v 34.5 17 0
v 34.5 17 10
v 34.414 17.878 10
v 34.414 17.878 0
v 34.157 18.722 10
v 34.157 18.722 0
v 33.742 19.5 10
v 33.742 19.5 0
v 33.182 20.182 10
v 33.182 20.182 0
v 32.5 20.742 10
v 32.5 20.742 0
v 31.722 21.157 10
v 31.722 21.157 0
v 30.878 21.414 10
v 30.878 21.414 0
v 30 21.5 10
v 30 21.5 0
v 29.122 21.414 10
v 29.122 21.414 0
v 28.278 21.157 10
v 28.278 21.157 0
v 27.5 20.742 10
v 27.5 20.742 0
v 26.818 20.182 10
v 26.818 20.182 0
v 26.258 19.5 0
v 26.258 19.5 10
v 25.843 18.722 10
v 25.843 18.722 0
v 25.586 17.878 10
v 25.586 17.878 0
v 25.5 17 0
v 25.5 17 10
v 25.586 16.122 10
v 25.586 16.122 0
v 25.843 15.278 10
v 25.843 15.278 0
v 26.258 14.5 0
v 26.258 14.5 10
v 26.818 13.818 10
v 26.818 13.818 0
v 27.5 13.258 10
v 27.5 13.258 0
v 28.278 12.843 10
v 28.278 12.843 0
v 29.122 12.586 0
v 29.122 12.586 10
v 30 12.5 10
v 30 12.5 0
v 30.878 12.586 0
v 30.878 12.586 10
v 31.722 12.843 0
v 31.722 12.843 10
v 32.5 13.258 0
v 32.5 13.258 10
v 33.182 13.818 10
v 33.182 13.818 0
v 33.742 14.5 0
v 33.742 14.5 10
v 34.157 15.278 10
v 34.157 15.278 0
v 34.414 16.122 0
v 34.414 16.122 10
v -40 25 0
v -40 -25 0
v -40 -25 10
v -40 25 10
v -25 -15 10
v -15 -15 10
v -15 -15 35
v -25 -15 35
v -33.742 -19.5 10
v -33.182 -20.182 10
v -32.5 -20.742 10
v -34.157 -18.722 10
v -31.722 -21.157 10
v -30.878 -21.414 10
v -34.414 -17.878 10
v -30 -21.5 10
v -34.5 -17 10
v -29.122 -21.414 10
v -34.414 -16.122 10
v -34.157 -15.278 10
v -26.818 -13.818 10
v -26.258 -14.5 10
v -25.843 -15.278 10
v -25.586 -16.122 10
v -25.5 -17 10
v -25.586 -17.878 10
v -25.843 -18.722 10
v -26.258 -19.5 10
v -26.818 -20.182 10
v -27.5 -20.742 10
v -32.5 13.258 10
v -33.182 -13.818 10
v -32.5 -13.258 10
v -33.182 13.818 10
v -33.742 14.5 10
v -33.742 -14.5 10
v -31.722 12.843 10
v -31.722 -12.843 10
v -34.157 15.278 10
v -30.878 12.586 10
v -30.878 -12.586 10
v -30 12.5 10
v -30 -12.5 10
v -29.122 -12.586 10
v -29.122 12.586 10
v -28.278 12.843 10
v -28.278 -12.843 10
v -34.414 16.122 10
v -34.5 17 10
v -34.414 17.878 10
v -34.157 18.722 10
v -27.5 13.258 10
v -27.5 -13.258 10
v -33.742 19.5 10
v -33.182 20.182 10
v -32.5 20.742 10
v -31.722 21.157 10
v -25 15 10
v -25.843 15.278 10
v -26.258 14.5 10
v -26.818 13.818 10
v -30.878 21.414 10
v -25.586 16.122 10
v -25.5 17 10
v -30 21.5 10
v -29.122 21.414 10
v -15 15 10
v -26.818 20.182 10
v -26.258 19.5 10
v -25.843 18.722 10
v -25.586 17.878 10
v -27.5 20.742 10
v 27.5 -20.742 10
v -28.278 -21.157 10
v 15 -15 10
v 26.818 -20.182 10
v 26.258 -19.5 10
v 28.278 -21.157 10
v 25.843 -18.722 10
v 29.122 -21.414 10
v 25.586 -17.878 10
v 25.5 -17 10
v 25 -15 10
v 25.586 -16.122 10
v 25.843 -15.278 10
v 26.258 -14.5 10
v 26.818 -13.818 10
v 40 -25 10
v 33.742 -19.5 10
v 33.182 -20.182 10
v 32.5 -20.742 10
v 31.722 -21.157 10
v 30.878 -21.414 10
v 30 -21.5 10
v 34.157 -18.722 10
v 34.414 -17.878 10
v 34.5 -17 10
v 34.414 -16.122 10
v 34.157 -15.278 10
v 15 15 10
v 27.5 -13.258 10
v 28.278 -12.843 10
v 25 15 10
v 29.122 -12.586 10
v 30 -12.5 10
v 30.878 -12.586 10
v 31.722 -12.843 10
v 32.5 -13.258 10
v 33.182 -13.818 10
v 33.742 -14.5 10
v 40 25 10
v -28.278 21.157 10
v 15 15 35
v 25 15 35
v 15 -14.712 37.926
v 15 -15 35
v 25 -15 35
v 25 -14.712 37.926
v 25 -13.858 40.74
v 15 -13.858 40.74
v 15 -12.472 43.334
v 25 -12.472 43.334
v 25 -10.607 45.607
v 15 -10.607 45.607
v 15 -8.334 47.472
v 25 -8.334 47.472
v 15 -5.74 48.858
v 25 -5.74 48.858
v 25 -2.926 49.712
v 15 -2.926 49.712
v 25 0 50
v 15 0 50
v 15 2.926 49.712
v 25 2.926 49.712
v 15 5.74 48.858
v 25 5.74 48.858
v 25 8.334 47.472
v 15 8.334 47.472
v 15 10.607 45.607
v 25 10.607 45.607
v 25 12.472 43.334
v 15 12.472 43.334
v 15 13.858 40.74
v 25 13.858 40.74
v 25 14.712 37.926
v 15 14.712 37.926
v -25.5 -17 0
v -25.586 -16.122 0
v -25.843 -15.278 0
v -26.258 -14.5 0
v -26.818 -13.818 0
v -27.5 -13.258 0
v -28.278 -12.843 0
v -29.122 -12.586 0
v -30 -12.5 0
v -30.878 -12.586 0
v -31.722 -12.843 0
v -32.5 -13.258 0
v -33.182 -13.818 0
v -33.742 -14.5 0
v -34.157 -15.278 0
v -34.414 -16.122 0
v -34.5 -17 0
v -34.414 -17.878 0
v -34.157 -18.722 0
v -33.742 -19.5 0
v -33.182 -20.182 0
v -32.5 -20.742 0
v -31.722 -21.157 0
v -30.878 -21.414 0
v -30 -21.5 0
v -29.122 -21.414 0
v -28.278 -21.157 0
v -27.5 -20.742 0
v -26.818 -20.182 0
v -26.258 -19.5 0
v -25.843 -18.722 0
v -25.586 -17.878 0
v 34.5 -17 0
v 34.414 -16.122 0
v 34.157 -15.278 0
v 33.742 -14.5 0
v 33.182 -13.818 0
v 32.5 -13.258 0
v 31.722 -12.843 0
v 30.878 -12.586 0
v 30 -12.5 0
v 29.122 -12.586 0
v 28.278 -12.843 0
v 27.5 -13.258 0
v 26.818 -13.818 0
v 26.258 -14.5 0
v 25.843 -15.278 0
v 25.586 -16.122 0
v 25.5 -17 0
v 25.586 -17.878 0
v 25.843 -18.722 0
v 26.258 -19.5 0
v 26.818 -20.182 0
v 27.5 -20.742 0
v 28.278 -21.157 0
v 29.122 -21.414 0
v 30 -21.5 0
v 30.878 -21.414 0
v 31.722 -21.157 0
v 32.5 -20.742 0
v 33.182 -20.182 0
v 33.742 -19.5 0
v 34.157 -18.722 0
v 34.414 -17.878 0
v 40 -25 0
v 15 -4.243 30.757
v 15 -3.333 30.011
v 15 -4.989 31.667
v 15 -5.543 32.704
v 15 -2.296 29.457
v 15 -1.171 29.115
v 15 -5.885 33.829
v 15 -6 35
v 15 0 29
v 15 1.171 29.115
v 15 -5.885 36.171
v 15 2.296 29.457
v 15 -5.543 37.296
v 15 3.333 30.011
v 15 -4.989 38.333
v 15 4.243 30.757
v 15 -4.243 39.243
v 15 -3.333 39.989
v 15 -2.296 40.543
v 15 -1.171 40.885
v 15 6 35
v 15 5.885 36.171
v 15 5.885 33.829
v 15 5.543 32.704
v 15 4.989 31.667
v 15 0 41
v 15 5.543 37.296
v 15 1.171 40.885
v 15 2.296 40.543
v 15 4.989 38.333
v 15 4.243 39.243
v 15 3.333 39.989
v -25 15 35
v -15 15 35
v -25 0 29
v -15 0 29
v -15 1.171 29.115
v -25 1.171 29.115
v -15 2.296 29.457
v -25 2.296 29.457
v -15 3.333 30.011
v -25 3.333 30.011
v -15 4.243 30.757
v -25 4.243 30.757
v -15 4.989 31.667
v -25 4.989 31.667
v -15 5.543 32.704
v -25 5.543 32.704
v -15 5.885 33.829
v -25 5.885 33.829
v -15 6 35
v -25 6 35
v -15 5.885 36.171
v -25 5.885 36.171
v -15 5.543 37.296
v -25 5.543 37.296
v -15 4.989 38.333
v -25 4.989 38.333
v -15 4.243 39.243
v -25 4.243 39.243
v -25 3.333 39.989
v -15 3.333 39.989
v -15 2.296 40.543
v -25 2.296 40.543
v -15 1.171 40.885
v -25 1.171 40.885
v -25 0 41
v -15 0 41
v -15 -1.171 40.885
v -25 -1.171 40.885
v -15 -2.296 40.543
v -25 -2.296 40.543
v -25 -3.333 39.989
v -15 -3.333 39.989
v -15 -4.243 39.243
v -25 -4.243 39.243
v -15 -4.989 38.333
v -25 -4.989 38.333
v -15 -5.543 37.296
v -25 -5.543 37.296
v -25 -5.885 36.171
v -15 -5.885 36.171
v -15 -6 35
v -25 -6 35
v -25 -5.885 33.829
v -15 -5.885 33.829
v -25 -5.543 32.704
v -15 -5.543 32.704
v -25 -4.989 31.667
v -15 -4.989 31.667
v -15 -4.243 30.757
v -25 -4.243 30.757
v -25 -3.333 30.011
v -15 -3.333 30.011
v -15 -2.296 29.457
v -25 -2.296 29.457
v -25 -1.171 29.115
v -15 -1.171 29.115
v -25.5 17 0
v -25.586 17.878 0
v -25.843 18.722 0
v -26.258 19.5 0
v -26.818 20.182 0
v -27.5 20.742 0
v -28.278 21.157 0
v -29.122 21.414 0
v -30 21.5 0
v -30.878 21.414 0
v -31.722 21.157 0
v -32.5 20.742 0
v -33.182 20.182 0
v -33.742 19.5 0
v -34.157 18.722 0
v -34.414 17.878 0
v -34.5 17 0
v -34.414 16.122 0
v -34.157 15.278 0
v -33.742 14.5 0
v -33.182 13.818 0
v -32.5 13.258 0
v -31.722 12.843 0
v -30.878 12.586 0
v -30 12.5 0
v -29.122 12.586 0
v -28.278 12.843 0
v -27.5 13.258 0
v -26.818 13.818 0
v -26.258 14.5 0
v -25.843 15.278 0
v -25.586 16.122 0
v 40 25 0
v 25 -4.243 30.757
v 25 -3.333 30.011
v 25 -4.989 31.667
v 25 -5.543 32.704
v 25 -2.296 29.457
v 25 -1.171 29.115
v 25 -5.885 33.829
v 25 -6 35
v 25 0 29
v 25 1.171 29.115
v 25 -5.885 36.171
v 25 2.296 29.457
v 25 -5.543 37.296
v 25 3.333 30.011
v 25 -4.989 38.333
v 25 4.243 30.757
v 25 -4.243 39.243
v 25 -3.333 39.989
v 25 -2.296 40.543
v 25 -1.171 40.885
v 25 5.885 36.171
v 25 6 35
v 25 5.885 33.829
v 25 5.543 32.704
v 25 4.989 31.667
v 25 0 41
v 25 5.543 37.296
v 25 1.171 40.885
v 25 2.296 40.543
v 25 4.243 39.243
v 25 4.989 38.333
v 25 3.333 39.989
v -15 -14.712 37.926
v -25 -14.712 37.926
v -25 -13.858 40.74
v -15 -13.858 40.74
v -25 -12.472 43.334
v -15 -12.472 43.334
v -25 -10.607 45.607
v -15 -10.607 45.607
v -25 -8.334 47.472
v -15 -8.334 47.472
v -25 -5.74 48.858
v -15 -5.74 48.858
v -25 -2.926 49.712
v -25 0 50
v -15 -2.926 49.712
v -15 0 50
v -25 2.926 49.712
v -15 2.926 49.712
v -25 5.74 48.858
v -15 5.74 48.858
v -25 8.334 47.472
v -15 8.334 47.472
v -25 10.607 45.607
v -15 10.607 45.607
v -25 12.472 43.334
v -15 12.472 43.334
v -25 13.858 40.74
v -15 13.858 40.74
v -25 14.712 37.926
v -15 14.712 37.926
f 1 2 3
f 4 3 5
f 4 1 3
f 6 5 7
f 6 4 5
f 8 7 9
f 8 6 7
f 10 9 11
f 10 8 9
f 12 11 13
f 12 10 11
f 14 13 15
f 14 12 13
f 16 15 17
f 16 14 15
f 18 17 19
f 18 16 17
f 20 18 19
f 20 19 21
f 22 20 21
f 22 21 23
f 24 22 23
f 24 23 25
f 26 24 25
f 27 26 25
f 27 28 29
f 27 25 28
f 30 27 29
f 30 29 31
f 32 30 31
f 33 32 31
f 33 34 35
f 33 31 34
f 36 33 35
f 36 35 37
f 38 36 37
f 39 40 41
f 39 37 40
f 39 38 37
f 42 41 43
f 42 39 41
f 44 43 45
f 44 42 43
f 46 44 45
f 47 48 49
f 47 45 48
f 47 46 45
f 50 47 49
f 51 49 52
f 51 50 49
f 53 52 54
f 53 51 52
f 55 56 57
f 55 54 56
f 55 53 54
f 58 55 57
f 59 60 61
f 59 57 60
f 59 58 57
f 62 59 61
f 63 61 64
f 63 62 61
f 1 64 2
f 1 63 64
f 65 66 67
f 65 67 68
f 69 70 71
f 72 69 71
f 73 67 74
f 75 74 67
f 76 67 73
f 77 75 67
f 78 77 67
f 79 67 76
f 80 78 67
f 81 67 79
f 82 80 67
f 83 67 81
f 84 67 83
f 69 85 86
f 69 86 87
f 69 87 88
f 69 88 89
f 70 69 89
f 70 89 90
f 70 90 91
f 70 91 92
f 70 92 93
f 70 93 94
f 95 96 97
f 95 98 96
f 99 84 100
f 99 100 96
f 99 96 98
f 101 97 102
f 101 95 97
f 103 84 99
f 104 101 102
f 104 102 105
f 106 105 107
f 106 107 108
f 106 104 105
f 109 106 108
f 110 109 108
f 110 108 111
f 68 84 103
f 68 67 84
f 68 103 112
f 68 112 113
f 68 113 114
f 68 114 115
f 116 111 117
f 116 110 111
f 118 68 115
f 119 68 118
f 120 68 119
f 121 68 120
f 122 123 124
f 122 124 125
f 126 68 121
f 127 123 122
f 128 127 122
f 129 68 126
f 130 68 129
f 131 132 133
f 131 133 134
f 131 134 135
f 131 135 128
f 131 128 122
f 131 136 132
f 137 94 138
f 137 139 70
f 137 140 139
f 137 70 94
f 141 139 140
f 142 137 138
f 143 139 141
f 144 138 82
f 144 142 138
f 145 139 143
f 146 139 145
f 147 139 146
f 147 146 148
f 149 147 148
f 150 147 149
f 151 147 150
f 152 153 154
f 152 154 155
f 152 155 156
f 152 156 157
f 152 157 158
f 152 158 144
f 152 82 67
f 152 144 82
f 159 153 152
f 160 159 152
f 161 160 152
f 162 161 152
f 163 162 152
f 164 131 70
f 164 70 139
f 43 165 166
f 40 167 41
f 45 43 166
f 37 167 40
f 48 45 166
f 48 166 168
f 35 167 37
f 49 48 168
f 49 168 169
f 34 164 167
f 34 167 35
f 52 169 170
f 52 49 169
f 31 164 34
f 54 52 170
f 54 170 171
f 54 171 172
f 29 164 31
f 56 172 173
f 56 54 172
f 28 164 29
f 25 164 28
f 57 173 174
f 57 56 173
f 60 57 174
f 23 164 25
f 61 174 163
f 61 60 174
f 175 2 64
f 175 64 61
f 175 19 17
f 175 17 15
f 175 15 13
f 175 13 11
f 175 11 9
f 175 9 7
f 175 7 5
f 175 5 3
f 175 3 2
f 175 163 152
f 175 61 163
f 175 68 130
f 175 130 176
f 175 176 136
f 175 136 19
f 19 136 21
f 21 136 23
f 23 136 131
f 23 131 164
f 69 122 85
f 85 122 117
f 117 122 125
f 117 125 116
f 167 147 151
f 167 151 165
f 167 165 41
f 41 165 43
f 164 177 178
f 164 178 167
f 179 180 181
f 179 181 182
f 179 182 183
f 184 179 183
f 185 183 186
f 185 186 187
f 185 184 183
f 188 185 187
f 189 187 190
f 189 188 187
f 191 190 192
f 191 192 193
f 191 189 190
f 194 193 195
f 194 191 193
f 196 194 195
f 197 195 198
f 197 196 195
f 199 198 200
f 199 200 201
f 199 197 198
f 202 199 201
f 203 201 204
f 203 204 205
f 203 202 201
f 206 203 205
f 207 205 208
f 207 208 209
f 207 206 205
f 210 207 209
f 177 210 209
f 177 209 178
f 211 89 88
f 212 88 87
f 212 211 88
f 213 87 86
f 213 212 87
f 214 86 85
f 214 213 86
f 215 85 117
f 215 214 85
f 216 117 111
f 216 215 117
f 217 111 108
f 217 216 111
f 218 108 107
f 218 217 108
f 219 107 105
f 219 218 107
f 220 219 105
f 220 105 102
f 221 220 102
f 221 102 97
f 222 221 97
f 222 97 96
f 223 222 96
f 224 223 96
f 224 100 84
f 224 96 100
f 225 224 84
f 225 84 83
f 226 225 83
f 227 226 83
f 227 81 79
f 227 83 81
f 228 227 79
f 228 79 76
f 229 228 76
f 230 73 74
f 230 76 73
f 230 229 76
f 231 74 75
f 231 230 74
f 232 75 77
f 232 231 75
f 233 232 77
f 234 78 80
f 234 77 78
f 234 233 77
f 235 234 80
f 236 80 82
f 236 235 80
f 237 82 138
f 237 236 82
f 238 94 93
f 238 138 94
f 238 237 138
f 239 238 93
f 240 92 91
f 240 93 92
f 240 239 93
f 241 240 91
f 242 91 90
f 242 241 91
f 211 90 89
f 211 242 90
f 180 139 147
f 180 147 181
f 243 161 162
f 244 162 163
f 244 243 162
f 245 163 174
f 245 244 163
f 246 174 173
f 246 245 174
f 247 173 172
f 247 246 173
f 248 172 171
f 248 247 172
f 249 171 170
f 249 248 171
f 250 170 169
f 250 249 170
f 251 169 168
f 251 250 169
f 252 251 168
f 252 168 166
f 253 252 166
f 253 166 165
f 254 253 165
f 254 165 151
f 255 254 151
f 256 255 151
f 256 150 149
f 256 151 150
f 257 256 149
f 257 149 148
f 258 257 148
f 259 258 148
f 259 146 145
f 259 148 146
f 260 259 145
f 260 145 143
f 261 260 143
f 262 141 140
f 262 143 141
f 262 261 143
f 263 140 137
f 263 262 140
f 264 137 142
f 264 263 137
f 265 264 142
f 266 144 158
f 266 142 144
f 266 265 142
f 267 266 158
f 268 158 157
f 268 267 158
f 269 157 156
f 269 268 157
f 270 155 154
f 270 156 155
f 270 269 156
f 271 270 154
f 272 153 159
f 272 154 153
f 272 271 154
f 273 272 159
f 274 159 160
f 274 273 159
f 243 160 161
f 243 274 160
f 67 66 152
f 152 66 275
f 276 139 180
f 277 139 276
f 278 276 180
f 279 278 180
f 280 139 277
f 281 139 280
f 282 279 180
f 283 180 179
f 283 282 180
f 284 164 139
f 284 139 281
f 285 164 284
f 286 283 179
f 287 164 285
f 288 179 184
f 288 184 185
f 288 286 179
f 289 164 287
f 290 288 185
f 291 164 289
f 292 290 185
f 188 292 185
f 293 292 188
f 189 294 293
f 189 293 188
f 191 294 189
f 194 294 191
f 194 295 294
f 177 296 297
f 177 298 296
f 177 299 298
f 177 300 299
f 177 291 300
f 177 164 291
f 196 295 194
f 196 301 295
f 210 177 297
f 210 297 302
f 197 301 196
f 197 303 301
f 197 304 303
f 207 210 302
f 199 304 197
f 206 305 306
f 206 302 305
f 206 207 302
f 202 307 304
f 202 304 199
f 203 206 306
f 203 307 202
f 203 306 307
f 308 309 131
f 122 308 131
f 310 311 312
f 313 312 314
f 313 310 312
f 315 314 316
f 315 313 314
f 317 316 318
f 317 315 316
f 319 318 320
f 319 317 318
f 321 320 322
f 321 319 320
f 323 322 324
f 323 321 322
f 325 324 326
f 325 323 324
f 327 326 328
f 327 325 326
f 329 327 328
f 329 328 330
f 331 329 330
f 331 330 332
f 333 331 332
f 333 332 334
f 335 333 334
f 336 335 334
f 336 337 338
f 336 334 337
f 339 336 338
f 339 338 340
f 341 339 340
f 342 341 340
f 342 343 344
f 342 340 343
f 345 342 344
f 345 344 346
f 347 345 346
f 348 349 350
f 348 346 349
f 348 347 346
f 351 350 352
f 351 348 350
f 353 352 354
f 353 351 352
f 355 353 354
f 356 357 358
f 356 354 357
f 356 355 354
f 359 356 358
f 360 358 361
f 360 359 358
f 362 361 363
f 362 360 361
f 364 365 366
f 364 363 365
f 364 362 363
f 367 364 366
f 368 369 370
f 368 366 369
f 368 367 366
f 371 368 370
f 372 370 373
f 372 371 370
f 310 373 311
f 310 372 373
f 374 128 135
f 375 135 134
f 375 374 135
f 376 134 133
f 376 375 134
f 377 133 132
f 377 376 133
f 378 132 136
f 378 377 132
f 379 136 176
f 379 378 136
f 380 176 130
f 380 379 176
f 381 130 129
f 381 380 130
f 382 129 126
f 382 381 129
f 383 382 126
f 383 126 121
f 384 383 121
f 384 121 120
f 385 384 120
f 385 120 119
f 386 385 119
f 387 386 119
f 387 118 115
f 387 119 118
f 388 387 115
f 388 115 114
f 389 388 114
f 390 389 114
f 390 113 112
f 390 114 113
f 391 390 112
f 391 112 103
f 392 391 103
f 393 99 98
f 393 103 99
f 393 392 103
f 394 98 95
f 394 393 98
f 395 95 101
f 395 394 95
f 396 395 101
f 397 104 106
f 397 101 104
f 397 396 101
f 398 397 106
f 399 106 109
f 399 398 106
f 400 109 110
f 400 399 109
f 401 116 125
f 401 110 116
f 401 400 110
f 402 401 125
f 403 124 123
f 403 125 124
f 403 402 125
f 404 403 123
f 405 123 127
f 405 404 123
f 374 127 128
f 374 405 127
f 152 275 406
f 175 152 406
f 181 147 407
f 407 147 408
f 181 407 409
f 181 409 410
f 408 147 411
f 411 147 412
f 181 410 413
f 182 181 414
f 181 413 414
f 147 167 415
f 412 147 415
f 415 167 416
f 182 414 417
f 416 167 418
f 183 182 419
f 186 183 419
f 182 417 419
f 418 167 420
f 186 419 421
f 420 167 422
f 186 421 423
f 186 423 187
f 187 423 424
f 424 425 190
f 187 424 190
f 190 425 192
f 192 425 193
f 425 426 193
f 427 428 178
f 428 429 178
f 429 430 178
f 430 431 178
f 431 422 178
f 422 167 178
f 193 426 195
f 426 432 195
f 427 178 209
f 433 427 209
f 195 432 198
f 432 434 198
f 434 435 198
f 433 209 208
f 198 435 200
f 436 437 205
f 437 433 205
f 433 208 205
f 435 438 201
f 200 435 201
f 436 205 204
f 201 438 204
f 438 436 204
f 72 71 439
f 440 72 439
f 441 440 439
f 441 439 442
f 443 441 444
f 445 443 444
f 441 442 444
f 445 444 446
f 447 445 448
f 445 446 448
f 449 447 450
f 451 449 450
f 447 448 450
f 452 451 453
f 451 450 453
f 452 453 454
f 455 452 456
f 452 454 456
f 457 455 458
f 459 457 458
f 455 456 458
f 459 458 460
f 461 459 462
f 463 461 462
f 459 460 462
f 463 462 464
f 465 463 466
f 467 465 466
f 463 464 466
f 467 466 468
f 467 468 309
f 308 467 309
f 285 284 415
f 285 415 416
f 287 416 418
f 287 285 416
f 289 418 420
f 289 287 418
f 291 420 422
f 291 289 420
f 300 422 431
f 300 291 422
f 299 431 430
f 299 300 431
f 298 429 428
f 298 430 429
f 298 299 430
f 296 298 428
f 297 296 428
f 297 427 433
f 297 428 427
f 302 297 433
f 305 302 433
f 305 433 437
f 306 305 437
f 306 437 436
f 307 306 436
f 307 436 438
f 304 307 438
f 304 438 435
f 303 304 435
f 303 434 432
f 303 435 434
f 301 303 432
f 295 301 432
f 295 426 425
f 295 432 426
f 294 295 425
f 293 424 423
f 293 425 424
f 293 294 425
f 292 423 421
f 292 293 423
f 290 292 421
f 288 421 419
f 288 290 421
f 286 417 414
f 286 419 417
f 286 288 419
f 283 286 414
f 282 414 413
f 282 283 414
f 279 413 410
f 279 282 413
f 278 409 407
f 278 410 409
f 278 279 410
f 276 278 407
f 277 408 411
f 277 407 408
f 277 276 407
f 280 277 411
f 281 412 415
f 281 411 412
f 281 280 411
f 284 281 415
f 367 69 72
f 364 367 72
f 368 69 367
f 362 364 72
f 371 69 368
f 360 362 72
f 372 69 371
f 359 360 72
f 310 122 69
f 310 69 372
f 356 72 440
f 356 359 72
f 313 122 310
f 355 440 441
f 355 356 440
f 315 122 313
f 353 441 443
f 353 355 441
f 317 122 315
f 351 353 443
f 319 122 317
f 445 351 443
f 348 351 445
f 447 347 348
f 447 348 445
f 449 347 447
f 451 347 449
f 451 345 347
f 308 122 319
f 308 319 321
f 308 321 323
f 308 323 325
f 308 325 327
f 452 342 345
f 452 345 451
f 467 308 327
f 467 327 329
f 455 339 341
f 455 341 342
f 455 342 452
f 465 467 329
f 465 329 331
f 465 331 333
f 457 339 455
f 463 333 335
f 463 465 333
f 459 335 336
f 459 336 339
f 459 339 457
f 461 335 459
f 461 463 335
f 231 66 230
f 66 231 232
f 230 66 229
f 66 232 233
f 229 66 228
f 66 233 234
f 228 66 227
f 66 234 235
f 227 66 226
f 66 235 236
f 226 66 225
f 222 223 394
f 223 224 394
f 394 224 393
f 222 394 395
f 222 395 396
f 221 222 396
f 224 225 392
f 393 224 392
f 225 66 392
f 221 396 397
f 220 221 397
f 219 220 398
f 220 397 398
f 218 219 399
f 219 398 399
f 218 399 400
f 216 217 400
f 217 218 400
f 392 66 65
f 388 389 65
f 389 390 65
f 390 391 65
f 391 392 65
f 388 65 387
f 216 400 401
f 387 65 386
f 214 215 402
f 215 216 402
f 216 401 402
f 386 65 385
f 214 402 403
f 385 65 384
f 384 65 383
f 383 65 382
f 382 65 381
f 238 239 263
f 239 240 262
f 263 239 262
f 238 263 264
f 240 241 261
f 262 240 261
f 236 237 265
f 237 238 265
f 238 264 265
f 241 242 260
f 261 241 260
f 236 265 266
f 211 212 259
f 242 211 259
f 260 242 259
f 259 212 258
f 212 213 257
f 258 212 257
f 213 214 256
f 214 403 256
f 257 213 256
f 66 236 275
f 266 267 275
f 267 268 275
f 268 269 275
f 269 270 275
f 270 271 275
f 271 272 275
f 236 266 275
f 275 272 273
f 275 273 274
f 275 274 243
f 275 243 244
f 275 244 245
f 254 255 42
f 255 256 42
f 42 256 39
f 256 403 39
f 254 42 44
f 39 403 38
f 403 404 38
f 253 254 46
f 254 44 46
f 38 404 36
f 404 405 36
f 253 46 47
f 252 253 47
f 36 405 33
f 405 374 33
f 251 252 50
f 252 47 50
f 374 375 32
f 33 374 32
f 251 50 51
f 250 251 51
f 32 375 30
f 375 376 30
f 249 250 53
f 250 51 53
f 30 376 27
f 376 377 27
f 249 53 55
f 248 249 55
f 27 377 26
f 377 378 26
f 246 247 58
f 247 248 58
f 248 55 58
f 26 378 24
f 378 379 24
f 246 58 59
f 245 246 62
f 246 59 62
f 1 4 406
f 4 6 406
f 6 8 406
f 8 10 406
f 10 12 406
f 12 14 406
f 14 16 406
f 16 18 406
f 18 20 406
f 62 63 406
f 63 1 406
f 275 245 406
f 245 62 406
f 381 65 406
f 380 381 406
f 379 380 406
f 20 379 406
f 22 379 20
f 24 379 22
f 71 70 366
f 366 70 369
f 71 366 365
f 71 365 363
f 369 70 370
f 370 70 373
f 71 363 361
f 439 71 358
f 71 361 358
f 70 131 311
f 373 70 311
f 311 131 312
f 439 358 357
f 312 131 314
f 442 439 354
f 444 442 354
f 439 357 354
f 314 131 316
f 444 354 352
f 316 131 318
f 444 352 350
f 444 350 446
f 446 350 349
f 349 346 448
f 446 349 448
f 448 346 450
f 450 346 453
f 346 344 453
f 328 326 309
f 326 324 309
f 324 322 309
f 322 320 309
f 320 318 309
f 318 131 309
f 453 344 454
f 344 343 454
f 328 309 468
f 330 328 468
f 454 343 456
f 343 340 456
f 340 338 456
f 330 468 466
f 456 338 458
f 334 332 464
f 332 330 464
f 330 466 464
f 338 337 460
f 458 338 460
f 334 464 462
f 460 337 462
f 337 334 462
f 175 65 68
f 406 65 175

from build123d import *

# Parameters (mm, degrees)
SKETCH_1_W          = 80
SKETCH_1_H          = 50
EXTRUDE_1_DEPTH     = 10
EXTRUDE_2_DEPTH     = 10
SKETCH_3_R          = 6
CUT_EXTRUDE_1_DEPTH = 86.732140997
SKETCH_4_R          = 4.5
CUT_EXTRUDE_2_DEPTH = 69.738635424


with BuildPart() as part:
    # 草图1 → 凸台-拉伸1 (new body)
    with BuildSketch(Plane.XY):
        Rectangle(SKETCH_1_W, SKETCH_1_H)
    extrude(amount=EXTRUDE_1_DEPTH)

    # 草图2 → 凸台-拉伸2 (add)
    with BuildSketch(Plane(origin=(15, 0, 0), x_dir=(0, 0, -1), z_dir=(1, 0, 0))):
        with BuildLine():
            Line((-9.5, -15), (-35, -15))
            ThreePointArc((-35, -15), (-50, 0), (-35, 15))
            Line((-35, 15), (-9.5, 15))
            Line((-9.5, 15), (-9.5, -15))
        make_face()
    extrude_2 = extrude(amount=EXTRUDE_2_DEPTH)

    # 镜向1: 凸台-拉伸2 across plane
    add(extrude_2.mirror(Plane(origin=(0, 0, 0), x_dir=(0, 0, 1), z_dir=(1, 0, 0))))

    # 草图3 → 切除-拉伸1 (cut, through all)
    with BuildSketch(Plane(origin=(-25, 0, 0), x_dir=(0, 0, -1), z_dir=(1, 0, 0))):
        with Locations((-35, 0)):
            Circle(SKETCH_3_R)
    extrude(amount=CUT_EXTRUDE_1_DEPTH, mode=Mode.SUBTRACT)

    # 草图4 → 切除-拉伸2 (cut, through all)
    with BuildSketch(Plane.XY):
        with Locations((30, 17)):
            Circle(SKETCH_4_R)
        with Locations((30, -17)):
            Circle(SKETCH_4_R)
        with Locations((-30, 17)):
            Circle(SKETCH_4_R)
        with Locations((-30, -17)):
            Circle(SKETCH_4_R)
    extrude(amount=CUT_EXTRUDE_2_DEPTH, mode=Mode.SUBTRACT)


solid = part.part
